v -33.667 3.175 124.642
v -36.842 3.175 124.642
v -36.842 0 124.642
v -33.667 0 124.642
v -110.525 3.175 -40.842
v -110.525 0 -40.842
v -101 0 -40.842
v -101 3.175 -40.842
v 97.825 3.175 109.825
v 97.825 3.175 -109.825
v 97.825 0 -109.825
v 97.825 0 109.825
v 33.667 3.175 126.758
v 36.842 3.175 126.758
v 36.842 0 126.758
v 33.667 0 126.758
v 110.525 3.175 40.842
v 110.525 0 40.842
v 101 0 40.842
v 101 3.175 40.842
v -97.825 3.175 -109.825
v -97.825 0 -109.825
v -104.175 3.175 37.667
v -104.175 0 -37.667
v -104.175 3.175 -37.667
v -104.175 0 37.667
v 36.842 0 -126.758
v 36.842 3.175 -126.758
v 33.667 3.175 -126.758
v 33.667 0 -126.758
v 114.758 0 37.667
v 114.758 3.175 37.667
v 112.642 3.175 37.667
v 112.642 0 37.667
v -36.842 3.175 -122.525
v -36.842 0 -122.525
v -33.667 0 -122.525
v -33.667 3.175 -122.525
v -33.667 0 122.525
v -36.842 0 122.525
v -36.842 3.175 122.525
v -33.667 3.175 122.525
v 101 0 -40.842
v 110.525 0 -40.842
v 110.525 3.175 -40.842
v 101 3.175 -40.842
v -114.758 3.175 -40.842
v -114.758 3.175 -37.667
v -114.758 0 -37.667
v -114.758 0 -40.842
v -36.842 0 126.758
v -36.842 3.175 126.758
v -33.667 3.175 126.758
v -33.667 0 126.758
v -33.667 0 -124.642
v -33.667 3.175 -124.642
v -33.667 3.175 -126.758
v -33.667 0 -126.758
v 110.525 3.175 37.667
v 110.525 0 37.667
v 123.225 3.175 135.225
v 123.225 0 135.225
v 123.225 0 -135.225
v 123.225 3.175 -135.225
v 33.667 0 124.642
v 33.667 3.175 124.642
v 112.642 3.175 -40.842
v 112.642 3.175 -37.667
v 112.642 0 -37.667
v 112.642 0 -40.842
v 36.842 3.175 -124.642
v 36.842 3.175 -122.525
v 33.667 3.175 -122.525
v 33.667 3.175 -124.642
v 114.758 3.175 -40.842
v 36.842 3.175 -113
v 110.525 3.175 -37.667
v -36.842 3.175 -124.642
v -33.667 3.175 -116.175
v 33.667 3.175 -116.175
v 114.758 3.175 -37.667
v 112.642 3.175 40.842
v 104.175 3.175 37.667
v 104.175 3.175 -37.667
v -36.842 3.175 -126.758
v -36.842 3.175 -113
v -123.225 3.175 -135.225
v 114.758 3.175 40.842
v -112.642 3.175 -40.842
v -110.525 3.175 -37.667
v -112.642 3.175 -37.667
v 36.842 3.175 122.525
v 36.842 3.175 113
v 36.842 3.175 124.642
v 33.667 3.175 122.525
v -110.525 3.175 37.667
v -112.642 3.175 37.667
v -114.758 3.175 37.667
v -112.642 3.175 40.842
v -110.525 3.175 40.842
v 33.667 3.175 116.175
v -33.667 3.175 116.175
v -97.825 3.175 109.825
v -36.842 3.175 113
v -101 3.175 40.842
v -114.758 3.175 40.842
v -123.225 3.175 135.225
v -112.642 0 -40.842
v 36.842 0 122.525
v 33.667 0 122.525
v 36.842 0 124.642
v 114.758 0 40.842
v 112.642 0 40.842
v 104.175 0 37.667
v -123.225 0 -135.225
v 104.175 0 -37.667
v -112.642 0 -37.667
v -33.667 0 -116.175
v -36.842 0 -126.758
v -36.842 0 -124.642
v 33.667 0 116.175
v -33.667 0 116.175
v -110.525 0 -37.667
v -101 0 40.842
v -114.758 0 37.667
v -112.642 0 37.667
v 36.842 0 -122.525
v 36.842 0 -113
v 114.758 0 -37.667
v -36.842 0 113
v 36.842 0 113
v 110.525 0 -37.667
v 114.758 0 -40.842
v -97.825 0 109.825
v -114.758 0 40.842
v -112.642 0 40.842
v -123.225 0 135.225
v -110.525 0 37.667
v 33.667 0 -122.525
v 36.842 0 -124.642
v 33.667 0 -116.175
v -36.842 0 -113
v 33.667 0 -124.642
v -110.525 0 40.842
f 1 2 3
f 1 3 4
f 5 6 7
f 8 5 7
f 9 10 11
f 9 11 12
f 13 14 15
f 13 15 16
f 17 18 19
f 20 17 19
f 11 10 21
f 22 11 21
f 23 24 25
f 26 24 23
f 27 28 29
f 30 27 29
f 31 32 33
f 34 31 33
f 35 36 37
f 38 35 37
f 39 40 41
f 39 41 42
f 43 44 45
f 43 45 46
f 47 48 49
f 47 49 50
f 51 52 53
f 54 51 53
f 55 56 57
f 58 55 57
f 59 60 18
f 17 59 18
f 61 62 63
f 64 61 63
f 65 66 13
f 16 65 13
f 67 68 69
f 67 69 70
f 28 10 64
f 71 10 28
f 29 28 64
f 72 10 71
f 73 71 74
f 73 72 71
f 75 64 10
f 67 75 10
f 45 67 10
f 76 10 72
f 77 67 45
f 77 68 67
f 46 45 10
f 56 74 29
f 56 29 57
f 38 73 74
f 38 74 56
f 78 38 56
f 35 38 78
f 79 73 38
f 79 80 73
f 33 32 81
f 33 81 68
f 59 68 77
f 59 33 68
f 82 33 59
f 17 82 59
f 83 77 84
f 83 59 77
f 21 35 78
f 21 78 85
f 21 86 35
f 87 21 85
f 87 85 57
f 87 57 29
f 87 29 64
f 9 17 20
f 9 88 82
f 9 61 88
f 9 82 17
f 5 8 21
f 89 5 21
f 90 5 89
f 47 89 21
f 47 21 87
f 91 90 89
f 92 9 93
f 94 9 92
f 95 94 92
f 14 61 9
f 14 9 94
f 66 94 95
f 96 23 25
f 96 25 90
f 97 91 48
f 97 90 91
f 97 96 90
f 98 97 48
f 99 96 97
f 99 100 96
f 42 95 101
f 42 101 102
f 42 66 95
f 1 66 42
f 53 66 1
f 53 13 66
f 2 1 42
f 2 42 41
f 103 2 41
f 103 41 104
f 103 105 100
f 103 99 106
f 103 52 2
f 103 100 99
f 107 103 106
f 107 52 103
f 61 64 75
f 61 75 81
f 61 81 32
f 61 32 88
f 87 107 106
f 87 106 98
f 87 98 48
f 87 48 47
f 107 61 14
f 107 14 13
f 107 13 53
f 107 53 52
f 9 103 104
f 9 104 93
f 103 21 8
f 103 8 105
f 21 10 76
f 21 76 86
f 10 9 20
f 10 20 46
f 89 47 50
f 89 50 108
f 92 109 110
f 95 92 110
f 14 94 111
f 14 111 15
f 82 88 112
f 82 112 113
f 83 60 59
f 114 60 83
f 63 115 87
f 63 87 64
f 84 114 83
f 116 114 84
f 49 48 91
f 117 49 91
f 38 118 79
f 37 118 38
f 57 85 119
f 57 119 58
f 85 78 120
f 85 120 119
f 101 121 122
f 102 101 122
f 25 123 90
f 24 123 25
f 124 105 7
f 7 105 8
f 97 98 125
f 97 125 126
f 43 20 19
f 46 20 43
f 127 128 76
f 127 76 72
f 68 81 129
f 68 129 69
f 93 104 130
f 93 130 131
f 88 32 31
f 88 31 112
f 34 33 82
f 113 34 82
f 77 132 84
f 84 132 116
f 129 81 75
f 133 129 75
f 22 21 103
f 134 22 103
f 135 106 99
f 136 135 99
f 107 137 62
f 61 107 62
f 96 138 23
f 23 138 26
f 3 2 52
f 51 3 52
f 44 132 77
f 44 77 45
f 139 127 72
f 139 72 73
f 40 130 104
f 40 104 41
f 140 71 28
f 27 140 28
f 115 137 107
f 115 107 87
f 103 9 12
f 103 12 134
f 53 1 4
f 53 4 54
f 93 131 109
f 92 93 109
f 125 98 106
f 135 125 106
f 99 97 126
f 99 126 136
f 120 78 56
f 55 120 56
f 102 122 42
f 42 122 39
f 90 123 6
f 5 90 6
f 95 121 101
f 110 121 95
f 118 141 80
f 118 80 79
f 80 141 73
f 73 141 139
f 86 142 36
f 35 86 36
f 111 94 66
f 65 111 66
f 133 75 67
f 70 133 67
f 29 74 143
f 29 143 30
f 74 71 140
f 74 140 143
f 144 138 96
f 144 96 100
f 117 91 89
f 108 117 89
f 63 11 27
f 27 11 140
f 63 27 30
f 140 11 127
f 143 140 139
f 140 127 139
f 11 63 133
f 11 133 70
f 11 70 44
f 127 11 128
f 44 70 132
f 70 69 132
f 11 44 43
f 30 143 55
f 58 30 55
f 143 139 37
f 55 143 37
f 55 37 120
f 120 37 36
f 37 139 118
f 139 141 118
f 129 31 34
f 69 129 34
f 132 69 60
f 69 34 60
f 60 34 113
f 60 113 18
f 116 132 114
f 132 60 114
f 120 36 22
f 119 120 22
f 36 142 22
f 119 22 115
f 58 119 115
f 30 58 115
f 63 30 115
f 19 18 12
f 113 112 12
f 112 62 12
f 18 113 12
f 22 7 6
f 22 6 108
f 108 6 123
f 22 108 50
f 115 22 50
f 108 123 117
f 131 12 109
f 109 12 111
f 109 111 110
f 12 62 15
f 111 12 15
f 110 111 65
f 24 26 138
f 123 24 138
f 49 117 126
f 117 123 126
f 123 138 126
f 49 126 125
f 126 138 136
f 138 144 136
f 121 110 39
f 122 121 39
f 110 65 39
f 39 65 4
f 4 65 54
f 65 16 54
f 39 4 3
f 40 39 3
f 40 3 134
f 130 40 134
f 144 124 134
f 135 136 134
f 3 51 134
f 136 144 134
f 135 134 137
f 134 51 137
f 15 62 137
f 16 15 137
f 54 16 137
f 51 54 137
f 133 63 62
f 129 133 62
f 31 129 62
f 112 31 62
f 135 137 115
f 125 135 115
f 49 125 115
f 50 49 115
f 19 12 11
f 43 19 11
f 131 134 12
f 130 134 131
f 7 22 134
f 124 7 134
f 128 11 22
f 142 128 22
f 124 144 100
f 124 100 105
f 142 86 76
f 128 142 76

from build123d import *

# Parameters (mm, degrees)
SKETCH1_W                 = 2.116666666
SKETCH1_H                 = 3.175
SKETCH1_W_2               = 3.175
SKETCH1_H_2               = 2.116666666
SKETCH1_W_3               = 6.35
SKETCH1_H_3               = 37.666666667
SKETCH1_W_4               = 33.666666667
SKETCH1_H_4               = 6.35
BOSS_EXTRUDE1_DEPTH       = 3.175
SKETCH3_W                 = 3.175
SKETCH3_H                 = 3.175
SKETCH3_W_2               = 97.825
SKETCH3_H_2               = 109.825
BOSS_EXTRUDE2_DEPTH       = 3.175
MIRROR5_COPY_1_SKETCH_W   = 2.116666666
MIRROR5_COPY_1_SKETCH_H   = 3.175
MIRROR5_COPY_1_SKETCH_W_2 = 3.175
MIRROR5_COPY_1_SKETCH_H_2 = 2.116666666
MIRROR5_COPY_1_SKETCH_W_3 = 6.35
MIRROR5_COPY_1_SKETCH_H_3 = 37.666666667
MIRROR5_COPY_1_SKETCH_W_4 = 33.666666667
MIRROR5_COPY_1_SKETCH_H_4 = 6.35
MIRROR5_COPY_1_DEPTH      = 3.175
MIRROR5_COPY_2_SKETCH_W   = 3.175
MIRROR5_COPY_2_SKETCH_H   = 3.175
MIRROR5_COPY_2_SKETCH_W_2 = 97.825
MIRROR5_COPY_2_SKETCH_H_2 = 109.825
MIRROR5_COPY_2_DEPTH      = 3.175


with BuildPart() as part:
    # Sketch1 → Boss-Extrude1 (new body)
    # profile 1 of 4: a face of its own
    with BuildSketch(Plane(origin=(0, 0, 0), x_dir=(1, 0, 0), z_dir=(0, 1, 0))):
        Polygon((0, 122.525), (0, 135.225), (-123.225, 135.225), (-123.225, 0), (-110.525, 0), (-110.525, 37.666666667), (-110.525, 40.841666667), (-110.525, 122.525), (-78.927699489, 122.525), (-36.841666667, 122.525), (-33.666666667, 122.525), align=None)
        with Locations((-113.7, 39.254166667)):
            Rectangle(SKETCH1_W, SKETCH1_H, mode=Mode.SUBTRACT)
        with Locations((-35.254166667, 125.7)):
            Rectangle(SKETCH1_W_2, SKETCH1_H_2, mode=Mode.SUBTRACT)
    # profile 2 of 4: a face of its own
    with BuildSketch(Plane(origin=(0, 0, 0), x_dir=(1, 0, 0), z_dir=(0, 1, 0))):
        with Locations((-107.35, 18.833333334)):
            Rectangle(SKETCH1_W_3, SKETCH1_H_3)
    # profile 3 of 4: a face of its own
    with BuildSketch(Plane(origin=(0, 0, 0), x_dir=(1, 0, 0), z_dir=(0, 1, 0))):
        Polygon((-36.841666667, 113), (-36.841666667, 122.525), (-78.927699489, 122.525), (-110.525, 122.525), (-110.525, 40.841666667), (-101, 40.841666667), (-101, 113), align=None)
    # profile 4 of 4: a face of its own
    with BuildSketch(Plane(origin=(0, 0, 0), x_dir=(1, 0, 0), z_dir=(0, 1, 0))):
        with Locations((-16.833333334, 119.35)):
            Rectangle(SKETCH1_W_4, SKETCH1_H_4)
    boss_extrude1 = extrude(amount=BOSS_EXTRUDE1_DEPTH)

    # Sketch3 → Boss-Extrude2 (add)
    with BuildSketch(Plane(origin=(0, 3.175, 0), x_dir=(1, 0, 0), z_dir=(0, 1, 0))):
        with Locations((-99.4125, 111.4125)):
            Rectangle(SKETCH3_W, SKETCH3_H)
        with Locations((-48.9125, 111.4125)):
            Rectangle(SKETCH3_W_2, SKETCH3_H)
        with Locations((-99.4125, 54.9125)):
            Rectangle(SKETCH3_W, SKETCH3_H_2)
    boss_extrude2 = extrude(amount=-BOSS_EXTRUDE2_DEPTH)

    # Mirror4: Boss-Extrude1, Boss-Extrude2 across plane
    add(boss_extrude1.mirror(Plane(origin=(0, 0, 0), x_dir=(0, 0, 1), z_dir=(1, 0, 0))))
    add(boss_extrude2.mirror(Plane(origin=(0, 0, 0), x_dir=(0, 0, 1), z_dir=(1, 0, 0))))

    # Mirror5: Boss-Extrude1, Boss-Extrude2 across plane
    add(boss_extrude1.mirror(Plane.XY))
    add(boss_extrude2.mirror(Plane.XY))

    # Mirror5 copy 1 sketch → Mirror5 copy 1 (add)
    # profile 1 of 4: a face of its own
    with BuildSketch(Plane(origin=(0, 0, 0), x_dir=(-1, 0, 0), z_dir=(0, 1, 0))):
        Polygon((0, 122.525), (0, 135.225), (-123.225, 135.225), (-123.225, 0), (-110.525, 0), (-110.525, 37.666666667), (-110.525, 40.841666667), (-110.525, 122.525), (-78.927699489, 122.525), (-36.841666667, 122.525), (-33.666666667, 122.525), align=None)
        with Locations((-113.7, 39.254166667)):
            Rectangle(MIRROR5_COPY_1_SKETCH_W, MIRROR5_COPY_1_SKETCH_H, mode=Mode.SUBTRACT)
        with Locations((-35.254166667, 125.7)):
            Rectangle(MIRROR5_COPY_1_SKETCH_W_2, MIRROR5_COPY_1_SKETCH_H_2, mode=Mode.SUBTRACT)
    # profile 2 of 4: a face of its own
    with BuildSketch(Plane(origin=(0, 0, 0), x_dir=(-1, 0, 0), z_dir=(0, 1, 0))):
        with Locations((-107.35, 18.833333334)):
            Rectangle(MIRROR5_COPY_1_SKETCH_W_3, MIRROR5_COPY_1_SKETCH_H_3)
    # profile 3 of 4: a face of its own
    with BuildSketch(Plane(origin=(0, 0, 0), x_dir=(-1, 0, 0), z_dir=(0, 1, 0))):
        Polygon((-36.841666667, 113), (-36.841666667, 122.525), (-78.927699489, 122.525), (-110.525, 122.525), (-110.525, 40.841666667), (-101, 40.841666667), (-101, 113), align=None)
    # profile 4 of 4: a face of its own
    with BuildSketch(Plane(origin=(0, 0, 0), x_dir=(-1, 0, 0), z_dir=(0, 1, 0))):
        with Locations((-16.833333334, 119.35)):
            Rectangle(MIRROR5_COPY_1_SKETCH_W_4, MIRROR5_COPY_1_SKETCH_H_4)
    extrude(amount=MIRROR5_COPY_1_DEPTH)

    # Mirror5 copy 2 sketch → Mirror5 copy 2 (add)
    with BuildSketch(Plane(origin=(0, 3.175, 0), x_dir=(-1, 0, 0), z_dir=(0, 1, 0))):
        with Locations((-99.4125, 111.4125)):
            Rectangle(MIRROR5_COPY_2_SKETCH_W, MIRROR5_COPY_2_SKETCH_H)
        with Locations((-48.9125, 111.4125)):
            Rectangle(MIRROR5_COPY_2_SKETCH_W_2, MIRROR5_COPY_2_SKETCH_H)
        with Locations((-99.4125, 54.9125)):
            Rectangle(MIRROR5_COPY_2_SKETCH_W, MIRROR5_COPY_2_SKETCH_H_2)
    extrude(amount=-MIRROR5_COPY_2_DEPTH)


solid = part.part
